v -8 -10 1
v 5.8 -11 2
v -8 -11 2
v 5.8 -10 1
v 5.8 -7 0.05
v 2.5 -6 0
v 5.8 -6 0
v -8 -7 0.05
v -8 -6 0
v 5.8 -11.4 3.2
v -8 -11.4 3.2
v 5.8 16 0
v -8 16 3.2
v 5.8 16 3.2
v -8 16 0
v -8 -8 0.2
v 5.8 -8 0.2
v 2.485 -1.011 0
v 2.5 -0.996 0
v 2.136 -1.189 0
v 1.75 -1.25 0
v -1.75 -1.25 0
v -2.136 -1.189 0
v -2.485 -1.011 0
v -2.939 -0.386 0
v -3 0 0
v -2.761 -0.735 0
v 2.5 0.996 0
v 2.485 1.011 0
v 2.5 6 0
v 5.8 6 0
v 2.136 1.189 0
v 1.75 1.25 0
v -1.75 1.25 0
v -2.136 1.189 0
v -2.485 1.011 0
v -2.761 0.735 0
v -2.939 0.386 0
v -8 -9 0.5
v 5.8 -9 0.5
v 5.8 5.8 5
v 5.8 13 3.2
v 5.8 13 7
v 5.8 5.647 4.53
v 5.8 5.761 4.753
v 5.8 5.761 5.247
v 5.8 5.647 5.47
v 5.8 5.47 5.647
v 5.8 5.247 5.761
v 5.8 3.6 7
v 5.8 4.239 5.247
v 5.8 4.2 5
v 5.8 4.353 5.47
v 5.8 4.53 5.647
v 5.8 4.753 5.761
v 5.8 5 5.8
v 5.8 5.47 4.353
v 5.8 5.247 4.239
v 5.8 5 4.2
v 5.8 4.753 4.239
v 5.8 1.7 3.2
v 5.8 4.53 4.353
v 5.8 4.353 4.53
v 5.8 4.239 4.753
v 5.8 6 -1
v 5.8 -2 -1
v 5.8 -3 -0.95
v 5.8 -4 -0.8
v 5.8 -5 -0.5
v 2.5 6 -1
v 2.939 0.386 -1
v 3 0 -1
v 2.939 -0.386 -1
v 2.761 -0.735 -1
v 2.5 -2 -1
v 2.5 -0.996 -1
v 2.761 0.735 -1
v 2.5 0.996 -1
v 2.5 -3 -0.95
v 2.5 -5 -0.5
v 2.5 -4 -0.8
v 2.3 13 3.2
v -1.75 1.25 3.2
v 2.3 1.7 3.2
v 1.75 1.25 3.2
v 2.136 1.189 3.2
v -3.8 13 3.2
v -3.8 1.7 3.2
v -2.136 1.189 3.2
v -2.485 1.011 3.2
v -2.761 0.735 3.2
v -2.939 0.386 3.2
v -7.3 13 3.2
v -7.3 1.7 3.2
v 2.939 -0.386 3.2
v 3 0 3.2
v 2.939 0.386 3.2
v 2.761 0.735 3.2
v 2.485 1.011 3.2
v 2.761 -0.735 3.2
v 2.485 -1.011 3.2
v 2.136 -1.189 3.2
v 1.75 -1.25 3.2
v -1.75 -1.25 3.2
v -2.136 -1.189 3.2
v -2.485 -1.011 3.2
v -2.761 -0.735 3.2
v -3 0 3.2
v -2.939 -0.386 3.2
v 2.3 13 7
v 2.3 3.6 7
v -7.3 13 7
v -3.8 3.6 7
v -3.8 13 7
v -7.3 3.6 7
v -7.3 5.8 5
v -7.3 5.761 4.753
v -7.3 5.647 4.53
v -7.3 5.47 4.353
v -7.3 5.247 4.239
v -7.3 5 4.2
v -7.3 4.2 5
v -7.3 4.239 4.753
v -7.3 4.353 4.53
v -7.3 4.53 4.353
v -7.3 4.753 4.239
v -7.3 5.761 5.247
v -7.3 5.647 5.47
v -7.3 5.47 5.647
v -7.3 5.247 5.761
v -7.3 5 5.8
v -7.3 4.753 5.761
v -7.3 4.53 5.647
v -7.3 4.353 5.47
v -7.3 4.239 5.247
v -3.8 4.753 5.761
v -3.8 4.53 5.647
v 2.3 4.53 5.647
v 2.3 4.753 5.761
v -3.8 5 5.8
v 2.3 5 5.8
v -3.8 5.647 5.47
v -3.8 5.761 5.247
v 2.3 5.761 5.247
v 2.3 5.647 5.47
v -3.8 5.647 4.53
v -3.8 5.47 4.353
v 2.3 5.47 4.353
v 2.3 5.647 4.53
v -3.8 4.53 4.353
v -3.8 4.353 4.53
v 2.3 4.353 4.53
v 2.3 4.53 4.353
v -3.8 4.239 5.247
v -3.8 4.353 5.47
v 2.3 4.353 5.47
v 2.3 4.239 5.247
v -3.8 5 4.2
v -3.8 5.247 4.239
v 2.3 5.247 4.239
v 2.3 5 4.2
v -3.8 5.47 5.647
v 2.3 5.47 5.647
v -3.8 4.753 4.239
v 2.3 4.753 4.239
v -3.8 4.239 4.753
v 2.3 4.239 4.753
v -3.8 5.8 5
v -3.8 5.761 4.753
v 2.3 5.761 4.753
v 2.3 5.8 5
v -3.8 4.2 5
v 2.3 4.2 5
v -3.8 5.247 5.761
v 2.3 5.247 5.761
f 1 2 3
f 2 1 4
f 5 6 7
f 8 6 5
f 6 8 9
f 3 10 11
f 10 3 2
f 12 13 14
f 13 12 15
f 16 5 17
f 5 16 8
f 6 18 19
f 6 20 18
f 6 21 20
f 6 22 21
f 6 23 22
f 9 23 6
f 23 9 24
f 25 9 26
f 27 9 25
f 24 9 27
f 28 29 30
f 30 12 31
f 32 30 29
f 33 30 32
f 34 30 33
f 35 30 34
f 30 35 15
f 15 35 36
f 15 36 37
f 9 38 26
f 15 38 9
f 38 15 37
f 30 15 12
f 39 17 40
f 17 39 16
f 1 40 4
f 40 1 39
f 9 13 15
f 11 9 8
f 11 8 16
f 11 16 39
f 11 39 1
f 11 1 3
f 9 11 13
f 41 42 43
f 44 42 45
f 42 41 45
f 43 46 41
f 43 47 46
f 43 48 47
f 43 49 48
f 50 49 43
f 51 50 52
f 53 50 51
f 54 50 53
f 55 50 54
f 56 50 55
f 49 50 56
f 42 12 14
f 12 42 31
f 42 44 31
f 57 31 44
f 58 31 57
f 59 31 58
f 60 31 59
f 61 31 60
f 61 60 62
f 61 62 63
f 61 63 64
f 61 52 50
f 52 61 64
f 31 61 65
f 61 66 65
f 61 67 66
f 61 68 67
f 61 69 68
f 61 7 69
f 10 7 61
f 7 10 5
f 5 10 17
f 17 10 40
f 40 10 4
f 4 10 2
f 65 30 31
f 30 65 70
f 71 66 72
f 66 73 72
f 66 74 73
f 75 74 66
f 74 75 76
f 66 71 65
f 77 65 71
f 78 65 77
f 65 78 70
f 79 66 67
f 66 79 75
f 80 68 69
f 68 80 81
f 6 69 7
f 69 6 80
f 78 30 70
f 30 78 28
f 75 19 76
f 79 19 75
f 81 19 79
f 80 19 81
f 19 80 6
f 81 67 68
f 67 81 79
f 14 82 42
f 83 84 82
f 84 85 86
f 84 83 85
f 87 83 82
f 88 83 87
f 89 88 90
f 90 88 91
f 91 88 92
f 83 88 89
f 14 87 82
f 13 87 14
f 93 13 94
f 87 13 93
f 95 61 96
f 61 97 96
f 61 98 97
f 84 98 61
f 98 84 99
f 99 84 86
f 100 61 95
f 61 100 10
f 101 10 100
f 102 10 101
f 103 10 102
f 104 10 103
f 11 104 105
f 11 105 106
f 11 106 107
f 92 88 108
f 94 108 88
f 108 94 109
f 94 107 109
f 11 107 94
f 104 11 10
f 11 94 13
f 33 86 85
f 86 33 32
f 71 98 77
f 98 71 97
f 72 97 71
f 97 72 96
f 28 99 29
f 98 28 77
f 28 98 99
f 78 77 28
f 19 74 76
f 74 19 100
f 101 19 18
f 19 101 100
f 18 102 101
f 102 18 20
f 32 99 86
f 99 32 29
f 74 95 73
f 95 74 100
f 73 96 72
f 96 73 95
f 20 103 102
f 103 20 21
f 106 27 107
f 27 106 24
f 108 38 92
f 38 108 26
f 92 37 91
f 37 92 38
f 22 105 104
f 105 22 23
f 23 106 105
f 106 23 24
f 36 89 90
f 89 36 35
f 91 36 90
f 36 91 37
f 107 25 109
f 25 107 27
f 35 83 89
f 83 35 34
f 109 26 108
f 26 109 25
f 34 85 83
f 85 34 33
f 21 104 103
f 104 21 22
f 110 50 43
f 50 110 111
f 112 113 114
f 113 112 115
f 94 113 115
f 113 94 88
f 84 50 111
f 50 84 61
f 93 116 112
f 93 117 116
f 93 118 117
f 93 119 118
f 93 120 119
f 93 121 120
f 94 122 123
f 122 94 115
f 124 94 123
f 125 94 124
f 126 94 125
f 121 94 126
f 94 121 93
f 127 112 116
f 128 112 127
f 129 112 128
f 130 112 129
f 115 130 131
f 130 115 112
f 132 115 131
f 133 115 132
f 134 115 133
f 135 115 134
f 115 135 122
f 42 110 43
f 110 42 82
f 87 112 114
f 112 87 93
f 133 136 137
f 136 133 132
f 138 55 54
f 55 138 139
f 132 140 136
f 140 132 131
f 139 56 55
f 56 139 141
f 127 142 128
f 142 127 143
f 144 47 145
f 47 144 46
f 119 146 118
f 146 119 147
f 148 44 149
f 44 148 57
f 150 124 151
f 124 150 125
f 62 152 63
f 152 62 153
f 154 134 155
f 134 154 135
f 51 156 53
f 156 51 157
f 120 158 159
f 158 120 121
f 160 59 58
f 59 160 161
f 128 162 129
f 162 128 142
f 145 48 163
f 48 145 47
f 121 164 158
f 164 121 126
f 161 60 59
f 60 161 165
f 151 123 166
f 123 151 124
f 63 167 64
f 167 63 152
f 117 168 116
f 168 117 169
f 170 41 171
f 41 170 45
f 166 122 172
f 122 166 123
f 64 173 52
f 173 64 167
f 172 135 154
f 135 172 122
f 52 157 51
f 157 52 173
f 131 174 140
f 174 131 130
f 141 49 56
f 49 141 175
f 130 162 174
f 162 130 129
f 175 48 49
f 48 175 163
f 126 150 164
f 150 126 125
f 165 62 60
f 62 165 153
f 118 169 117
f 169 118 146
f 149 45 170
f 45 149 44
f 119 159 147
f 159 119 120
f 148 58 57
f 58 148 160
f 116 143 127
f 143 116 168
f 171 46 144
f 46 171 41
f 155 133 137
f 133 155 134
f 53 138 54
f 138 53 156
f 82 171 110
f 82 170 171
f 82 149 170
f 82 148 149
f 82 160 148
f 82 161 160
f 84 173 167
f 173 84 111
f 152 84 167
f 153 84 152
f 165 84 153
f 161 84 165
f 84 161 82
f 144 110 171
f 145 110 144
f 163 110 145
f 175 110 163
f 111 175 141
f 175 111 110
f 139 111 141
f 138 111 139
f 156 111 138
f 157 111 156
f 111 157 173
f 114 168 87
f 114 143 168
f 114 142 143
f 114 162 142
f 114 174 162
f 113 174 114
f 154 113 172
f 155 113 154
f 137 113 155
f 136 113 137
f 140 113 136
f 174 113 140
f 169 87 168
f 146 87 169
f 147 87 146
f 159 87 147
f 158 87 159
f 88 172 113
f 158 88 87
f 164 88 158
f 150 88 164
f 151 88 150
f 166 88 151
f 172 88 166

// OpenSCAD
// The diameter of the MATIC rod
matic_rod_diameter = 1.6;

// The height at which the MATIC rod is placed over the plate (the least strict parameter, as the foot is amortized)
matic_rod_dz = 5.0; 

// The Y offset between the MATIC rod and the needle
matic_offset_dy = 5.0;

// The total width of the MATIC handle (including allowance)
matic_handle_width = 6.1; 

// The X offset between the needle and the center of the MATIC handle on Janome machines with a maximum stitch width of 7 mm 
janome_matic_offset_dx = -0.75; 

// The distance between the needle and the guide
guide_offset = 2.5;

// The nominal lenth of the needle tunnel (the maximal usable stich width)
needle_tunnel_length = 3.5;

// The distance between the needle and the non-guided edge
secondary_width = 8.0;

guide_min_width = 1.6;
ear_width = 3.5;

guide_depth = 1.0;
foot_base_height = 3.2;

primary_front_length = 6.0;
primary_back_length = 16.0;

short_guide_front_length = 2.0;
short_guide_back_length = 6.0;

ears_piece_width = matic_handle_width + ear_width * 2;
right_ear_edge_x = janome_matic_offset_dx + matic_handle_width / 2 + ear_width;

module reflection(
    mirror_vector = [1, 0, 0]
) {
    union() {
        children();
        mirror(mirror_vector) {
            children();
        }
    }
}

module make_wing(
    width,
    front_length,
    back_length,
) {
    h_max = 5.0;
    dx = 1;
    
    rotate([180, -90, 0])
    linear_extrude(height=width)
    polygon(
        points=[
            [h_max, -back_length],
            [0, -back_length],
            [0.00, front_length + dx * 0],
            [0.05, front_length + dx * 1],
            [0.20, front_length + dx * 2],
            [0.50, front_length + dx * 3],
            [1.00, front_length + dx * 4],
            [2.00, front_length + dx * 5],
            [h_max, front_length + dx * 6]
        ],
        paths=[
            [0, 1, 2, 3, 4, 5, 6, 7, 8],
        ]
    );
}

module top_cutter_global() {
    a = 40;
    h = 20;
    
    translate([-a / 2, -a / 2, foot_base_height])
    cube([a, a, h]);
}

module ears_piece_base_local() {
    back_length = 8.0;
    height = 4.0;
    
    translate([-ears_piece_width/2, 0, 0])
    rotate([180, -90, 0])
    linear_extrude(height=ears_piece_width)
    polygon(
        points=[
            [height / 2, -back_length],
            [-height / 2, -back_length],
            [-height / 2, 3.4],
            [height / 2, 1.4],
        ],
        paths=[
            [0, 1, 2, 3],
        ]
    );
}

module matic_rod_cutter_local() {
    length = 40;
    
    translate([-length / 2, 0, 0])
    rotate([180, -90, 0])
    cylinder(h = length, r = matic_rod_diameter / 2, $fn = 20);
}

module matic_handle_cutter_local() {
    a = matic_handle_width;
    h = 30;
    
    translate([-a / 2, -h / 2, -h / 2])
    cube([a, h, h]);
}

module ears_piece_local() {
    difference() {
        difference() {
            ears_piece_base_local();
            matic_rod_cutter_local();
        }
        matic_handle_cutter_local();
    }
}

module ears_piece_global() {
    translate([
        janome_matic_offset_dx,
        matic_offset_dy,
        matic_rod_dz,
    ])
    ears_piece_local();
}

module make_needle_tunnel_cutter(
    length,
    width,
) {
    height = 10;

    translate([0, 0, -height / 2]) {
        translate([-length / 2, -width / 2, 0])
        cube([length, width, height]);

        reflection([1, 0, 0]) {
            translate([length / 2, 0, 0])
            cylinder(h = height, r = width / 2, $fn = 20);
        }
    }
}

module needle_tunnel_cutter_global() {
    make_needle_tunnel_cutter(
        length = needle_tunnel_length,
        width = 2.5
    );
}

module make_guided_foot() {
    guide_front_length = short_guide_front_length;
    guide_back_length = short_guide_back_length;

    right_foot_base_edge_x = max(guide_offset, right_ear_edge_x);
    guide_width = max(right_foot_base_edge_x - guide_offset, guide_min_width);

    module foot_base_global() {
        translate([-secondary_width, 0, 0])
        make_wing(
            width = secondary_width + right_foot_base_edge_x,
            front_length = primary_front_length,
            back_length = primary_back_length
        );
    }

    module guide_global() {
        translate([guide_offset, 0, -guide_depth])
        make_wing(
            width = guide_width,
            front_length = guide_front_length,
            back_length = guide_back_length
        );
    }

    module guided_foot_global() {
        difference() {
            difference() {
                union() {
                    foot_base_global();
                    guide_global();
                }

                top_cutter_global();
            };

            needle_tunnel_cutter_global();
        }

        ears_piece_global();
    }

    guided_foot_global();
}

make_guided_foot();
